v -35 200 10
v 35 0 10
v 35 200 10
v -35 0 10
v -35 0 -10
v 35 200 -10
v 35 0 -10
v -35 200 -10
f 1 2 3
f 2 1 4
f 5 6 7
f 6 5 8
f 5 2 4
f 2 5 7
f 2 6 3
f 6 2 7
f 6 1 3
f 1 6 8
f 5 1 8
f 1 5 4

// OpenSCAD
module avion_aile(aa_lg=70, aa_pf=200, aa_ht=20)
{
    translate([-aa_lg/2, 0, -aa_ht/2])
    cube([aa_lg, aa_pf, aa_ht]);
}


avion_aile();
